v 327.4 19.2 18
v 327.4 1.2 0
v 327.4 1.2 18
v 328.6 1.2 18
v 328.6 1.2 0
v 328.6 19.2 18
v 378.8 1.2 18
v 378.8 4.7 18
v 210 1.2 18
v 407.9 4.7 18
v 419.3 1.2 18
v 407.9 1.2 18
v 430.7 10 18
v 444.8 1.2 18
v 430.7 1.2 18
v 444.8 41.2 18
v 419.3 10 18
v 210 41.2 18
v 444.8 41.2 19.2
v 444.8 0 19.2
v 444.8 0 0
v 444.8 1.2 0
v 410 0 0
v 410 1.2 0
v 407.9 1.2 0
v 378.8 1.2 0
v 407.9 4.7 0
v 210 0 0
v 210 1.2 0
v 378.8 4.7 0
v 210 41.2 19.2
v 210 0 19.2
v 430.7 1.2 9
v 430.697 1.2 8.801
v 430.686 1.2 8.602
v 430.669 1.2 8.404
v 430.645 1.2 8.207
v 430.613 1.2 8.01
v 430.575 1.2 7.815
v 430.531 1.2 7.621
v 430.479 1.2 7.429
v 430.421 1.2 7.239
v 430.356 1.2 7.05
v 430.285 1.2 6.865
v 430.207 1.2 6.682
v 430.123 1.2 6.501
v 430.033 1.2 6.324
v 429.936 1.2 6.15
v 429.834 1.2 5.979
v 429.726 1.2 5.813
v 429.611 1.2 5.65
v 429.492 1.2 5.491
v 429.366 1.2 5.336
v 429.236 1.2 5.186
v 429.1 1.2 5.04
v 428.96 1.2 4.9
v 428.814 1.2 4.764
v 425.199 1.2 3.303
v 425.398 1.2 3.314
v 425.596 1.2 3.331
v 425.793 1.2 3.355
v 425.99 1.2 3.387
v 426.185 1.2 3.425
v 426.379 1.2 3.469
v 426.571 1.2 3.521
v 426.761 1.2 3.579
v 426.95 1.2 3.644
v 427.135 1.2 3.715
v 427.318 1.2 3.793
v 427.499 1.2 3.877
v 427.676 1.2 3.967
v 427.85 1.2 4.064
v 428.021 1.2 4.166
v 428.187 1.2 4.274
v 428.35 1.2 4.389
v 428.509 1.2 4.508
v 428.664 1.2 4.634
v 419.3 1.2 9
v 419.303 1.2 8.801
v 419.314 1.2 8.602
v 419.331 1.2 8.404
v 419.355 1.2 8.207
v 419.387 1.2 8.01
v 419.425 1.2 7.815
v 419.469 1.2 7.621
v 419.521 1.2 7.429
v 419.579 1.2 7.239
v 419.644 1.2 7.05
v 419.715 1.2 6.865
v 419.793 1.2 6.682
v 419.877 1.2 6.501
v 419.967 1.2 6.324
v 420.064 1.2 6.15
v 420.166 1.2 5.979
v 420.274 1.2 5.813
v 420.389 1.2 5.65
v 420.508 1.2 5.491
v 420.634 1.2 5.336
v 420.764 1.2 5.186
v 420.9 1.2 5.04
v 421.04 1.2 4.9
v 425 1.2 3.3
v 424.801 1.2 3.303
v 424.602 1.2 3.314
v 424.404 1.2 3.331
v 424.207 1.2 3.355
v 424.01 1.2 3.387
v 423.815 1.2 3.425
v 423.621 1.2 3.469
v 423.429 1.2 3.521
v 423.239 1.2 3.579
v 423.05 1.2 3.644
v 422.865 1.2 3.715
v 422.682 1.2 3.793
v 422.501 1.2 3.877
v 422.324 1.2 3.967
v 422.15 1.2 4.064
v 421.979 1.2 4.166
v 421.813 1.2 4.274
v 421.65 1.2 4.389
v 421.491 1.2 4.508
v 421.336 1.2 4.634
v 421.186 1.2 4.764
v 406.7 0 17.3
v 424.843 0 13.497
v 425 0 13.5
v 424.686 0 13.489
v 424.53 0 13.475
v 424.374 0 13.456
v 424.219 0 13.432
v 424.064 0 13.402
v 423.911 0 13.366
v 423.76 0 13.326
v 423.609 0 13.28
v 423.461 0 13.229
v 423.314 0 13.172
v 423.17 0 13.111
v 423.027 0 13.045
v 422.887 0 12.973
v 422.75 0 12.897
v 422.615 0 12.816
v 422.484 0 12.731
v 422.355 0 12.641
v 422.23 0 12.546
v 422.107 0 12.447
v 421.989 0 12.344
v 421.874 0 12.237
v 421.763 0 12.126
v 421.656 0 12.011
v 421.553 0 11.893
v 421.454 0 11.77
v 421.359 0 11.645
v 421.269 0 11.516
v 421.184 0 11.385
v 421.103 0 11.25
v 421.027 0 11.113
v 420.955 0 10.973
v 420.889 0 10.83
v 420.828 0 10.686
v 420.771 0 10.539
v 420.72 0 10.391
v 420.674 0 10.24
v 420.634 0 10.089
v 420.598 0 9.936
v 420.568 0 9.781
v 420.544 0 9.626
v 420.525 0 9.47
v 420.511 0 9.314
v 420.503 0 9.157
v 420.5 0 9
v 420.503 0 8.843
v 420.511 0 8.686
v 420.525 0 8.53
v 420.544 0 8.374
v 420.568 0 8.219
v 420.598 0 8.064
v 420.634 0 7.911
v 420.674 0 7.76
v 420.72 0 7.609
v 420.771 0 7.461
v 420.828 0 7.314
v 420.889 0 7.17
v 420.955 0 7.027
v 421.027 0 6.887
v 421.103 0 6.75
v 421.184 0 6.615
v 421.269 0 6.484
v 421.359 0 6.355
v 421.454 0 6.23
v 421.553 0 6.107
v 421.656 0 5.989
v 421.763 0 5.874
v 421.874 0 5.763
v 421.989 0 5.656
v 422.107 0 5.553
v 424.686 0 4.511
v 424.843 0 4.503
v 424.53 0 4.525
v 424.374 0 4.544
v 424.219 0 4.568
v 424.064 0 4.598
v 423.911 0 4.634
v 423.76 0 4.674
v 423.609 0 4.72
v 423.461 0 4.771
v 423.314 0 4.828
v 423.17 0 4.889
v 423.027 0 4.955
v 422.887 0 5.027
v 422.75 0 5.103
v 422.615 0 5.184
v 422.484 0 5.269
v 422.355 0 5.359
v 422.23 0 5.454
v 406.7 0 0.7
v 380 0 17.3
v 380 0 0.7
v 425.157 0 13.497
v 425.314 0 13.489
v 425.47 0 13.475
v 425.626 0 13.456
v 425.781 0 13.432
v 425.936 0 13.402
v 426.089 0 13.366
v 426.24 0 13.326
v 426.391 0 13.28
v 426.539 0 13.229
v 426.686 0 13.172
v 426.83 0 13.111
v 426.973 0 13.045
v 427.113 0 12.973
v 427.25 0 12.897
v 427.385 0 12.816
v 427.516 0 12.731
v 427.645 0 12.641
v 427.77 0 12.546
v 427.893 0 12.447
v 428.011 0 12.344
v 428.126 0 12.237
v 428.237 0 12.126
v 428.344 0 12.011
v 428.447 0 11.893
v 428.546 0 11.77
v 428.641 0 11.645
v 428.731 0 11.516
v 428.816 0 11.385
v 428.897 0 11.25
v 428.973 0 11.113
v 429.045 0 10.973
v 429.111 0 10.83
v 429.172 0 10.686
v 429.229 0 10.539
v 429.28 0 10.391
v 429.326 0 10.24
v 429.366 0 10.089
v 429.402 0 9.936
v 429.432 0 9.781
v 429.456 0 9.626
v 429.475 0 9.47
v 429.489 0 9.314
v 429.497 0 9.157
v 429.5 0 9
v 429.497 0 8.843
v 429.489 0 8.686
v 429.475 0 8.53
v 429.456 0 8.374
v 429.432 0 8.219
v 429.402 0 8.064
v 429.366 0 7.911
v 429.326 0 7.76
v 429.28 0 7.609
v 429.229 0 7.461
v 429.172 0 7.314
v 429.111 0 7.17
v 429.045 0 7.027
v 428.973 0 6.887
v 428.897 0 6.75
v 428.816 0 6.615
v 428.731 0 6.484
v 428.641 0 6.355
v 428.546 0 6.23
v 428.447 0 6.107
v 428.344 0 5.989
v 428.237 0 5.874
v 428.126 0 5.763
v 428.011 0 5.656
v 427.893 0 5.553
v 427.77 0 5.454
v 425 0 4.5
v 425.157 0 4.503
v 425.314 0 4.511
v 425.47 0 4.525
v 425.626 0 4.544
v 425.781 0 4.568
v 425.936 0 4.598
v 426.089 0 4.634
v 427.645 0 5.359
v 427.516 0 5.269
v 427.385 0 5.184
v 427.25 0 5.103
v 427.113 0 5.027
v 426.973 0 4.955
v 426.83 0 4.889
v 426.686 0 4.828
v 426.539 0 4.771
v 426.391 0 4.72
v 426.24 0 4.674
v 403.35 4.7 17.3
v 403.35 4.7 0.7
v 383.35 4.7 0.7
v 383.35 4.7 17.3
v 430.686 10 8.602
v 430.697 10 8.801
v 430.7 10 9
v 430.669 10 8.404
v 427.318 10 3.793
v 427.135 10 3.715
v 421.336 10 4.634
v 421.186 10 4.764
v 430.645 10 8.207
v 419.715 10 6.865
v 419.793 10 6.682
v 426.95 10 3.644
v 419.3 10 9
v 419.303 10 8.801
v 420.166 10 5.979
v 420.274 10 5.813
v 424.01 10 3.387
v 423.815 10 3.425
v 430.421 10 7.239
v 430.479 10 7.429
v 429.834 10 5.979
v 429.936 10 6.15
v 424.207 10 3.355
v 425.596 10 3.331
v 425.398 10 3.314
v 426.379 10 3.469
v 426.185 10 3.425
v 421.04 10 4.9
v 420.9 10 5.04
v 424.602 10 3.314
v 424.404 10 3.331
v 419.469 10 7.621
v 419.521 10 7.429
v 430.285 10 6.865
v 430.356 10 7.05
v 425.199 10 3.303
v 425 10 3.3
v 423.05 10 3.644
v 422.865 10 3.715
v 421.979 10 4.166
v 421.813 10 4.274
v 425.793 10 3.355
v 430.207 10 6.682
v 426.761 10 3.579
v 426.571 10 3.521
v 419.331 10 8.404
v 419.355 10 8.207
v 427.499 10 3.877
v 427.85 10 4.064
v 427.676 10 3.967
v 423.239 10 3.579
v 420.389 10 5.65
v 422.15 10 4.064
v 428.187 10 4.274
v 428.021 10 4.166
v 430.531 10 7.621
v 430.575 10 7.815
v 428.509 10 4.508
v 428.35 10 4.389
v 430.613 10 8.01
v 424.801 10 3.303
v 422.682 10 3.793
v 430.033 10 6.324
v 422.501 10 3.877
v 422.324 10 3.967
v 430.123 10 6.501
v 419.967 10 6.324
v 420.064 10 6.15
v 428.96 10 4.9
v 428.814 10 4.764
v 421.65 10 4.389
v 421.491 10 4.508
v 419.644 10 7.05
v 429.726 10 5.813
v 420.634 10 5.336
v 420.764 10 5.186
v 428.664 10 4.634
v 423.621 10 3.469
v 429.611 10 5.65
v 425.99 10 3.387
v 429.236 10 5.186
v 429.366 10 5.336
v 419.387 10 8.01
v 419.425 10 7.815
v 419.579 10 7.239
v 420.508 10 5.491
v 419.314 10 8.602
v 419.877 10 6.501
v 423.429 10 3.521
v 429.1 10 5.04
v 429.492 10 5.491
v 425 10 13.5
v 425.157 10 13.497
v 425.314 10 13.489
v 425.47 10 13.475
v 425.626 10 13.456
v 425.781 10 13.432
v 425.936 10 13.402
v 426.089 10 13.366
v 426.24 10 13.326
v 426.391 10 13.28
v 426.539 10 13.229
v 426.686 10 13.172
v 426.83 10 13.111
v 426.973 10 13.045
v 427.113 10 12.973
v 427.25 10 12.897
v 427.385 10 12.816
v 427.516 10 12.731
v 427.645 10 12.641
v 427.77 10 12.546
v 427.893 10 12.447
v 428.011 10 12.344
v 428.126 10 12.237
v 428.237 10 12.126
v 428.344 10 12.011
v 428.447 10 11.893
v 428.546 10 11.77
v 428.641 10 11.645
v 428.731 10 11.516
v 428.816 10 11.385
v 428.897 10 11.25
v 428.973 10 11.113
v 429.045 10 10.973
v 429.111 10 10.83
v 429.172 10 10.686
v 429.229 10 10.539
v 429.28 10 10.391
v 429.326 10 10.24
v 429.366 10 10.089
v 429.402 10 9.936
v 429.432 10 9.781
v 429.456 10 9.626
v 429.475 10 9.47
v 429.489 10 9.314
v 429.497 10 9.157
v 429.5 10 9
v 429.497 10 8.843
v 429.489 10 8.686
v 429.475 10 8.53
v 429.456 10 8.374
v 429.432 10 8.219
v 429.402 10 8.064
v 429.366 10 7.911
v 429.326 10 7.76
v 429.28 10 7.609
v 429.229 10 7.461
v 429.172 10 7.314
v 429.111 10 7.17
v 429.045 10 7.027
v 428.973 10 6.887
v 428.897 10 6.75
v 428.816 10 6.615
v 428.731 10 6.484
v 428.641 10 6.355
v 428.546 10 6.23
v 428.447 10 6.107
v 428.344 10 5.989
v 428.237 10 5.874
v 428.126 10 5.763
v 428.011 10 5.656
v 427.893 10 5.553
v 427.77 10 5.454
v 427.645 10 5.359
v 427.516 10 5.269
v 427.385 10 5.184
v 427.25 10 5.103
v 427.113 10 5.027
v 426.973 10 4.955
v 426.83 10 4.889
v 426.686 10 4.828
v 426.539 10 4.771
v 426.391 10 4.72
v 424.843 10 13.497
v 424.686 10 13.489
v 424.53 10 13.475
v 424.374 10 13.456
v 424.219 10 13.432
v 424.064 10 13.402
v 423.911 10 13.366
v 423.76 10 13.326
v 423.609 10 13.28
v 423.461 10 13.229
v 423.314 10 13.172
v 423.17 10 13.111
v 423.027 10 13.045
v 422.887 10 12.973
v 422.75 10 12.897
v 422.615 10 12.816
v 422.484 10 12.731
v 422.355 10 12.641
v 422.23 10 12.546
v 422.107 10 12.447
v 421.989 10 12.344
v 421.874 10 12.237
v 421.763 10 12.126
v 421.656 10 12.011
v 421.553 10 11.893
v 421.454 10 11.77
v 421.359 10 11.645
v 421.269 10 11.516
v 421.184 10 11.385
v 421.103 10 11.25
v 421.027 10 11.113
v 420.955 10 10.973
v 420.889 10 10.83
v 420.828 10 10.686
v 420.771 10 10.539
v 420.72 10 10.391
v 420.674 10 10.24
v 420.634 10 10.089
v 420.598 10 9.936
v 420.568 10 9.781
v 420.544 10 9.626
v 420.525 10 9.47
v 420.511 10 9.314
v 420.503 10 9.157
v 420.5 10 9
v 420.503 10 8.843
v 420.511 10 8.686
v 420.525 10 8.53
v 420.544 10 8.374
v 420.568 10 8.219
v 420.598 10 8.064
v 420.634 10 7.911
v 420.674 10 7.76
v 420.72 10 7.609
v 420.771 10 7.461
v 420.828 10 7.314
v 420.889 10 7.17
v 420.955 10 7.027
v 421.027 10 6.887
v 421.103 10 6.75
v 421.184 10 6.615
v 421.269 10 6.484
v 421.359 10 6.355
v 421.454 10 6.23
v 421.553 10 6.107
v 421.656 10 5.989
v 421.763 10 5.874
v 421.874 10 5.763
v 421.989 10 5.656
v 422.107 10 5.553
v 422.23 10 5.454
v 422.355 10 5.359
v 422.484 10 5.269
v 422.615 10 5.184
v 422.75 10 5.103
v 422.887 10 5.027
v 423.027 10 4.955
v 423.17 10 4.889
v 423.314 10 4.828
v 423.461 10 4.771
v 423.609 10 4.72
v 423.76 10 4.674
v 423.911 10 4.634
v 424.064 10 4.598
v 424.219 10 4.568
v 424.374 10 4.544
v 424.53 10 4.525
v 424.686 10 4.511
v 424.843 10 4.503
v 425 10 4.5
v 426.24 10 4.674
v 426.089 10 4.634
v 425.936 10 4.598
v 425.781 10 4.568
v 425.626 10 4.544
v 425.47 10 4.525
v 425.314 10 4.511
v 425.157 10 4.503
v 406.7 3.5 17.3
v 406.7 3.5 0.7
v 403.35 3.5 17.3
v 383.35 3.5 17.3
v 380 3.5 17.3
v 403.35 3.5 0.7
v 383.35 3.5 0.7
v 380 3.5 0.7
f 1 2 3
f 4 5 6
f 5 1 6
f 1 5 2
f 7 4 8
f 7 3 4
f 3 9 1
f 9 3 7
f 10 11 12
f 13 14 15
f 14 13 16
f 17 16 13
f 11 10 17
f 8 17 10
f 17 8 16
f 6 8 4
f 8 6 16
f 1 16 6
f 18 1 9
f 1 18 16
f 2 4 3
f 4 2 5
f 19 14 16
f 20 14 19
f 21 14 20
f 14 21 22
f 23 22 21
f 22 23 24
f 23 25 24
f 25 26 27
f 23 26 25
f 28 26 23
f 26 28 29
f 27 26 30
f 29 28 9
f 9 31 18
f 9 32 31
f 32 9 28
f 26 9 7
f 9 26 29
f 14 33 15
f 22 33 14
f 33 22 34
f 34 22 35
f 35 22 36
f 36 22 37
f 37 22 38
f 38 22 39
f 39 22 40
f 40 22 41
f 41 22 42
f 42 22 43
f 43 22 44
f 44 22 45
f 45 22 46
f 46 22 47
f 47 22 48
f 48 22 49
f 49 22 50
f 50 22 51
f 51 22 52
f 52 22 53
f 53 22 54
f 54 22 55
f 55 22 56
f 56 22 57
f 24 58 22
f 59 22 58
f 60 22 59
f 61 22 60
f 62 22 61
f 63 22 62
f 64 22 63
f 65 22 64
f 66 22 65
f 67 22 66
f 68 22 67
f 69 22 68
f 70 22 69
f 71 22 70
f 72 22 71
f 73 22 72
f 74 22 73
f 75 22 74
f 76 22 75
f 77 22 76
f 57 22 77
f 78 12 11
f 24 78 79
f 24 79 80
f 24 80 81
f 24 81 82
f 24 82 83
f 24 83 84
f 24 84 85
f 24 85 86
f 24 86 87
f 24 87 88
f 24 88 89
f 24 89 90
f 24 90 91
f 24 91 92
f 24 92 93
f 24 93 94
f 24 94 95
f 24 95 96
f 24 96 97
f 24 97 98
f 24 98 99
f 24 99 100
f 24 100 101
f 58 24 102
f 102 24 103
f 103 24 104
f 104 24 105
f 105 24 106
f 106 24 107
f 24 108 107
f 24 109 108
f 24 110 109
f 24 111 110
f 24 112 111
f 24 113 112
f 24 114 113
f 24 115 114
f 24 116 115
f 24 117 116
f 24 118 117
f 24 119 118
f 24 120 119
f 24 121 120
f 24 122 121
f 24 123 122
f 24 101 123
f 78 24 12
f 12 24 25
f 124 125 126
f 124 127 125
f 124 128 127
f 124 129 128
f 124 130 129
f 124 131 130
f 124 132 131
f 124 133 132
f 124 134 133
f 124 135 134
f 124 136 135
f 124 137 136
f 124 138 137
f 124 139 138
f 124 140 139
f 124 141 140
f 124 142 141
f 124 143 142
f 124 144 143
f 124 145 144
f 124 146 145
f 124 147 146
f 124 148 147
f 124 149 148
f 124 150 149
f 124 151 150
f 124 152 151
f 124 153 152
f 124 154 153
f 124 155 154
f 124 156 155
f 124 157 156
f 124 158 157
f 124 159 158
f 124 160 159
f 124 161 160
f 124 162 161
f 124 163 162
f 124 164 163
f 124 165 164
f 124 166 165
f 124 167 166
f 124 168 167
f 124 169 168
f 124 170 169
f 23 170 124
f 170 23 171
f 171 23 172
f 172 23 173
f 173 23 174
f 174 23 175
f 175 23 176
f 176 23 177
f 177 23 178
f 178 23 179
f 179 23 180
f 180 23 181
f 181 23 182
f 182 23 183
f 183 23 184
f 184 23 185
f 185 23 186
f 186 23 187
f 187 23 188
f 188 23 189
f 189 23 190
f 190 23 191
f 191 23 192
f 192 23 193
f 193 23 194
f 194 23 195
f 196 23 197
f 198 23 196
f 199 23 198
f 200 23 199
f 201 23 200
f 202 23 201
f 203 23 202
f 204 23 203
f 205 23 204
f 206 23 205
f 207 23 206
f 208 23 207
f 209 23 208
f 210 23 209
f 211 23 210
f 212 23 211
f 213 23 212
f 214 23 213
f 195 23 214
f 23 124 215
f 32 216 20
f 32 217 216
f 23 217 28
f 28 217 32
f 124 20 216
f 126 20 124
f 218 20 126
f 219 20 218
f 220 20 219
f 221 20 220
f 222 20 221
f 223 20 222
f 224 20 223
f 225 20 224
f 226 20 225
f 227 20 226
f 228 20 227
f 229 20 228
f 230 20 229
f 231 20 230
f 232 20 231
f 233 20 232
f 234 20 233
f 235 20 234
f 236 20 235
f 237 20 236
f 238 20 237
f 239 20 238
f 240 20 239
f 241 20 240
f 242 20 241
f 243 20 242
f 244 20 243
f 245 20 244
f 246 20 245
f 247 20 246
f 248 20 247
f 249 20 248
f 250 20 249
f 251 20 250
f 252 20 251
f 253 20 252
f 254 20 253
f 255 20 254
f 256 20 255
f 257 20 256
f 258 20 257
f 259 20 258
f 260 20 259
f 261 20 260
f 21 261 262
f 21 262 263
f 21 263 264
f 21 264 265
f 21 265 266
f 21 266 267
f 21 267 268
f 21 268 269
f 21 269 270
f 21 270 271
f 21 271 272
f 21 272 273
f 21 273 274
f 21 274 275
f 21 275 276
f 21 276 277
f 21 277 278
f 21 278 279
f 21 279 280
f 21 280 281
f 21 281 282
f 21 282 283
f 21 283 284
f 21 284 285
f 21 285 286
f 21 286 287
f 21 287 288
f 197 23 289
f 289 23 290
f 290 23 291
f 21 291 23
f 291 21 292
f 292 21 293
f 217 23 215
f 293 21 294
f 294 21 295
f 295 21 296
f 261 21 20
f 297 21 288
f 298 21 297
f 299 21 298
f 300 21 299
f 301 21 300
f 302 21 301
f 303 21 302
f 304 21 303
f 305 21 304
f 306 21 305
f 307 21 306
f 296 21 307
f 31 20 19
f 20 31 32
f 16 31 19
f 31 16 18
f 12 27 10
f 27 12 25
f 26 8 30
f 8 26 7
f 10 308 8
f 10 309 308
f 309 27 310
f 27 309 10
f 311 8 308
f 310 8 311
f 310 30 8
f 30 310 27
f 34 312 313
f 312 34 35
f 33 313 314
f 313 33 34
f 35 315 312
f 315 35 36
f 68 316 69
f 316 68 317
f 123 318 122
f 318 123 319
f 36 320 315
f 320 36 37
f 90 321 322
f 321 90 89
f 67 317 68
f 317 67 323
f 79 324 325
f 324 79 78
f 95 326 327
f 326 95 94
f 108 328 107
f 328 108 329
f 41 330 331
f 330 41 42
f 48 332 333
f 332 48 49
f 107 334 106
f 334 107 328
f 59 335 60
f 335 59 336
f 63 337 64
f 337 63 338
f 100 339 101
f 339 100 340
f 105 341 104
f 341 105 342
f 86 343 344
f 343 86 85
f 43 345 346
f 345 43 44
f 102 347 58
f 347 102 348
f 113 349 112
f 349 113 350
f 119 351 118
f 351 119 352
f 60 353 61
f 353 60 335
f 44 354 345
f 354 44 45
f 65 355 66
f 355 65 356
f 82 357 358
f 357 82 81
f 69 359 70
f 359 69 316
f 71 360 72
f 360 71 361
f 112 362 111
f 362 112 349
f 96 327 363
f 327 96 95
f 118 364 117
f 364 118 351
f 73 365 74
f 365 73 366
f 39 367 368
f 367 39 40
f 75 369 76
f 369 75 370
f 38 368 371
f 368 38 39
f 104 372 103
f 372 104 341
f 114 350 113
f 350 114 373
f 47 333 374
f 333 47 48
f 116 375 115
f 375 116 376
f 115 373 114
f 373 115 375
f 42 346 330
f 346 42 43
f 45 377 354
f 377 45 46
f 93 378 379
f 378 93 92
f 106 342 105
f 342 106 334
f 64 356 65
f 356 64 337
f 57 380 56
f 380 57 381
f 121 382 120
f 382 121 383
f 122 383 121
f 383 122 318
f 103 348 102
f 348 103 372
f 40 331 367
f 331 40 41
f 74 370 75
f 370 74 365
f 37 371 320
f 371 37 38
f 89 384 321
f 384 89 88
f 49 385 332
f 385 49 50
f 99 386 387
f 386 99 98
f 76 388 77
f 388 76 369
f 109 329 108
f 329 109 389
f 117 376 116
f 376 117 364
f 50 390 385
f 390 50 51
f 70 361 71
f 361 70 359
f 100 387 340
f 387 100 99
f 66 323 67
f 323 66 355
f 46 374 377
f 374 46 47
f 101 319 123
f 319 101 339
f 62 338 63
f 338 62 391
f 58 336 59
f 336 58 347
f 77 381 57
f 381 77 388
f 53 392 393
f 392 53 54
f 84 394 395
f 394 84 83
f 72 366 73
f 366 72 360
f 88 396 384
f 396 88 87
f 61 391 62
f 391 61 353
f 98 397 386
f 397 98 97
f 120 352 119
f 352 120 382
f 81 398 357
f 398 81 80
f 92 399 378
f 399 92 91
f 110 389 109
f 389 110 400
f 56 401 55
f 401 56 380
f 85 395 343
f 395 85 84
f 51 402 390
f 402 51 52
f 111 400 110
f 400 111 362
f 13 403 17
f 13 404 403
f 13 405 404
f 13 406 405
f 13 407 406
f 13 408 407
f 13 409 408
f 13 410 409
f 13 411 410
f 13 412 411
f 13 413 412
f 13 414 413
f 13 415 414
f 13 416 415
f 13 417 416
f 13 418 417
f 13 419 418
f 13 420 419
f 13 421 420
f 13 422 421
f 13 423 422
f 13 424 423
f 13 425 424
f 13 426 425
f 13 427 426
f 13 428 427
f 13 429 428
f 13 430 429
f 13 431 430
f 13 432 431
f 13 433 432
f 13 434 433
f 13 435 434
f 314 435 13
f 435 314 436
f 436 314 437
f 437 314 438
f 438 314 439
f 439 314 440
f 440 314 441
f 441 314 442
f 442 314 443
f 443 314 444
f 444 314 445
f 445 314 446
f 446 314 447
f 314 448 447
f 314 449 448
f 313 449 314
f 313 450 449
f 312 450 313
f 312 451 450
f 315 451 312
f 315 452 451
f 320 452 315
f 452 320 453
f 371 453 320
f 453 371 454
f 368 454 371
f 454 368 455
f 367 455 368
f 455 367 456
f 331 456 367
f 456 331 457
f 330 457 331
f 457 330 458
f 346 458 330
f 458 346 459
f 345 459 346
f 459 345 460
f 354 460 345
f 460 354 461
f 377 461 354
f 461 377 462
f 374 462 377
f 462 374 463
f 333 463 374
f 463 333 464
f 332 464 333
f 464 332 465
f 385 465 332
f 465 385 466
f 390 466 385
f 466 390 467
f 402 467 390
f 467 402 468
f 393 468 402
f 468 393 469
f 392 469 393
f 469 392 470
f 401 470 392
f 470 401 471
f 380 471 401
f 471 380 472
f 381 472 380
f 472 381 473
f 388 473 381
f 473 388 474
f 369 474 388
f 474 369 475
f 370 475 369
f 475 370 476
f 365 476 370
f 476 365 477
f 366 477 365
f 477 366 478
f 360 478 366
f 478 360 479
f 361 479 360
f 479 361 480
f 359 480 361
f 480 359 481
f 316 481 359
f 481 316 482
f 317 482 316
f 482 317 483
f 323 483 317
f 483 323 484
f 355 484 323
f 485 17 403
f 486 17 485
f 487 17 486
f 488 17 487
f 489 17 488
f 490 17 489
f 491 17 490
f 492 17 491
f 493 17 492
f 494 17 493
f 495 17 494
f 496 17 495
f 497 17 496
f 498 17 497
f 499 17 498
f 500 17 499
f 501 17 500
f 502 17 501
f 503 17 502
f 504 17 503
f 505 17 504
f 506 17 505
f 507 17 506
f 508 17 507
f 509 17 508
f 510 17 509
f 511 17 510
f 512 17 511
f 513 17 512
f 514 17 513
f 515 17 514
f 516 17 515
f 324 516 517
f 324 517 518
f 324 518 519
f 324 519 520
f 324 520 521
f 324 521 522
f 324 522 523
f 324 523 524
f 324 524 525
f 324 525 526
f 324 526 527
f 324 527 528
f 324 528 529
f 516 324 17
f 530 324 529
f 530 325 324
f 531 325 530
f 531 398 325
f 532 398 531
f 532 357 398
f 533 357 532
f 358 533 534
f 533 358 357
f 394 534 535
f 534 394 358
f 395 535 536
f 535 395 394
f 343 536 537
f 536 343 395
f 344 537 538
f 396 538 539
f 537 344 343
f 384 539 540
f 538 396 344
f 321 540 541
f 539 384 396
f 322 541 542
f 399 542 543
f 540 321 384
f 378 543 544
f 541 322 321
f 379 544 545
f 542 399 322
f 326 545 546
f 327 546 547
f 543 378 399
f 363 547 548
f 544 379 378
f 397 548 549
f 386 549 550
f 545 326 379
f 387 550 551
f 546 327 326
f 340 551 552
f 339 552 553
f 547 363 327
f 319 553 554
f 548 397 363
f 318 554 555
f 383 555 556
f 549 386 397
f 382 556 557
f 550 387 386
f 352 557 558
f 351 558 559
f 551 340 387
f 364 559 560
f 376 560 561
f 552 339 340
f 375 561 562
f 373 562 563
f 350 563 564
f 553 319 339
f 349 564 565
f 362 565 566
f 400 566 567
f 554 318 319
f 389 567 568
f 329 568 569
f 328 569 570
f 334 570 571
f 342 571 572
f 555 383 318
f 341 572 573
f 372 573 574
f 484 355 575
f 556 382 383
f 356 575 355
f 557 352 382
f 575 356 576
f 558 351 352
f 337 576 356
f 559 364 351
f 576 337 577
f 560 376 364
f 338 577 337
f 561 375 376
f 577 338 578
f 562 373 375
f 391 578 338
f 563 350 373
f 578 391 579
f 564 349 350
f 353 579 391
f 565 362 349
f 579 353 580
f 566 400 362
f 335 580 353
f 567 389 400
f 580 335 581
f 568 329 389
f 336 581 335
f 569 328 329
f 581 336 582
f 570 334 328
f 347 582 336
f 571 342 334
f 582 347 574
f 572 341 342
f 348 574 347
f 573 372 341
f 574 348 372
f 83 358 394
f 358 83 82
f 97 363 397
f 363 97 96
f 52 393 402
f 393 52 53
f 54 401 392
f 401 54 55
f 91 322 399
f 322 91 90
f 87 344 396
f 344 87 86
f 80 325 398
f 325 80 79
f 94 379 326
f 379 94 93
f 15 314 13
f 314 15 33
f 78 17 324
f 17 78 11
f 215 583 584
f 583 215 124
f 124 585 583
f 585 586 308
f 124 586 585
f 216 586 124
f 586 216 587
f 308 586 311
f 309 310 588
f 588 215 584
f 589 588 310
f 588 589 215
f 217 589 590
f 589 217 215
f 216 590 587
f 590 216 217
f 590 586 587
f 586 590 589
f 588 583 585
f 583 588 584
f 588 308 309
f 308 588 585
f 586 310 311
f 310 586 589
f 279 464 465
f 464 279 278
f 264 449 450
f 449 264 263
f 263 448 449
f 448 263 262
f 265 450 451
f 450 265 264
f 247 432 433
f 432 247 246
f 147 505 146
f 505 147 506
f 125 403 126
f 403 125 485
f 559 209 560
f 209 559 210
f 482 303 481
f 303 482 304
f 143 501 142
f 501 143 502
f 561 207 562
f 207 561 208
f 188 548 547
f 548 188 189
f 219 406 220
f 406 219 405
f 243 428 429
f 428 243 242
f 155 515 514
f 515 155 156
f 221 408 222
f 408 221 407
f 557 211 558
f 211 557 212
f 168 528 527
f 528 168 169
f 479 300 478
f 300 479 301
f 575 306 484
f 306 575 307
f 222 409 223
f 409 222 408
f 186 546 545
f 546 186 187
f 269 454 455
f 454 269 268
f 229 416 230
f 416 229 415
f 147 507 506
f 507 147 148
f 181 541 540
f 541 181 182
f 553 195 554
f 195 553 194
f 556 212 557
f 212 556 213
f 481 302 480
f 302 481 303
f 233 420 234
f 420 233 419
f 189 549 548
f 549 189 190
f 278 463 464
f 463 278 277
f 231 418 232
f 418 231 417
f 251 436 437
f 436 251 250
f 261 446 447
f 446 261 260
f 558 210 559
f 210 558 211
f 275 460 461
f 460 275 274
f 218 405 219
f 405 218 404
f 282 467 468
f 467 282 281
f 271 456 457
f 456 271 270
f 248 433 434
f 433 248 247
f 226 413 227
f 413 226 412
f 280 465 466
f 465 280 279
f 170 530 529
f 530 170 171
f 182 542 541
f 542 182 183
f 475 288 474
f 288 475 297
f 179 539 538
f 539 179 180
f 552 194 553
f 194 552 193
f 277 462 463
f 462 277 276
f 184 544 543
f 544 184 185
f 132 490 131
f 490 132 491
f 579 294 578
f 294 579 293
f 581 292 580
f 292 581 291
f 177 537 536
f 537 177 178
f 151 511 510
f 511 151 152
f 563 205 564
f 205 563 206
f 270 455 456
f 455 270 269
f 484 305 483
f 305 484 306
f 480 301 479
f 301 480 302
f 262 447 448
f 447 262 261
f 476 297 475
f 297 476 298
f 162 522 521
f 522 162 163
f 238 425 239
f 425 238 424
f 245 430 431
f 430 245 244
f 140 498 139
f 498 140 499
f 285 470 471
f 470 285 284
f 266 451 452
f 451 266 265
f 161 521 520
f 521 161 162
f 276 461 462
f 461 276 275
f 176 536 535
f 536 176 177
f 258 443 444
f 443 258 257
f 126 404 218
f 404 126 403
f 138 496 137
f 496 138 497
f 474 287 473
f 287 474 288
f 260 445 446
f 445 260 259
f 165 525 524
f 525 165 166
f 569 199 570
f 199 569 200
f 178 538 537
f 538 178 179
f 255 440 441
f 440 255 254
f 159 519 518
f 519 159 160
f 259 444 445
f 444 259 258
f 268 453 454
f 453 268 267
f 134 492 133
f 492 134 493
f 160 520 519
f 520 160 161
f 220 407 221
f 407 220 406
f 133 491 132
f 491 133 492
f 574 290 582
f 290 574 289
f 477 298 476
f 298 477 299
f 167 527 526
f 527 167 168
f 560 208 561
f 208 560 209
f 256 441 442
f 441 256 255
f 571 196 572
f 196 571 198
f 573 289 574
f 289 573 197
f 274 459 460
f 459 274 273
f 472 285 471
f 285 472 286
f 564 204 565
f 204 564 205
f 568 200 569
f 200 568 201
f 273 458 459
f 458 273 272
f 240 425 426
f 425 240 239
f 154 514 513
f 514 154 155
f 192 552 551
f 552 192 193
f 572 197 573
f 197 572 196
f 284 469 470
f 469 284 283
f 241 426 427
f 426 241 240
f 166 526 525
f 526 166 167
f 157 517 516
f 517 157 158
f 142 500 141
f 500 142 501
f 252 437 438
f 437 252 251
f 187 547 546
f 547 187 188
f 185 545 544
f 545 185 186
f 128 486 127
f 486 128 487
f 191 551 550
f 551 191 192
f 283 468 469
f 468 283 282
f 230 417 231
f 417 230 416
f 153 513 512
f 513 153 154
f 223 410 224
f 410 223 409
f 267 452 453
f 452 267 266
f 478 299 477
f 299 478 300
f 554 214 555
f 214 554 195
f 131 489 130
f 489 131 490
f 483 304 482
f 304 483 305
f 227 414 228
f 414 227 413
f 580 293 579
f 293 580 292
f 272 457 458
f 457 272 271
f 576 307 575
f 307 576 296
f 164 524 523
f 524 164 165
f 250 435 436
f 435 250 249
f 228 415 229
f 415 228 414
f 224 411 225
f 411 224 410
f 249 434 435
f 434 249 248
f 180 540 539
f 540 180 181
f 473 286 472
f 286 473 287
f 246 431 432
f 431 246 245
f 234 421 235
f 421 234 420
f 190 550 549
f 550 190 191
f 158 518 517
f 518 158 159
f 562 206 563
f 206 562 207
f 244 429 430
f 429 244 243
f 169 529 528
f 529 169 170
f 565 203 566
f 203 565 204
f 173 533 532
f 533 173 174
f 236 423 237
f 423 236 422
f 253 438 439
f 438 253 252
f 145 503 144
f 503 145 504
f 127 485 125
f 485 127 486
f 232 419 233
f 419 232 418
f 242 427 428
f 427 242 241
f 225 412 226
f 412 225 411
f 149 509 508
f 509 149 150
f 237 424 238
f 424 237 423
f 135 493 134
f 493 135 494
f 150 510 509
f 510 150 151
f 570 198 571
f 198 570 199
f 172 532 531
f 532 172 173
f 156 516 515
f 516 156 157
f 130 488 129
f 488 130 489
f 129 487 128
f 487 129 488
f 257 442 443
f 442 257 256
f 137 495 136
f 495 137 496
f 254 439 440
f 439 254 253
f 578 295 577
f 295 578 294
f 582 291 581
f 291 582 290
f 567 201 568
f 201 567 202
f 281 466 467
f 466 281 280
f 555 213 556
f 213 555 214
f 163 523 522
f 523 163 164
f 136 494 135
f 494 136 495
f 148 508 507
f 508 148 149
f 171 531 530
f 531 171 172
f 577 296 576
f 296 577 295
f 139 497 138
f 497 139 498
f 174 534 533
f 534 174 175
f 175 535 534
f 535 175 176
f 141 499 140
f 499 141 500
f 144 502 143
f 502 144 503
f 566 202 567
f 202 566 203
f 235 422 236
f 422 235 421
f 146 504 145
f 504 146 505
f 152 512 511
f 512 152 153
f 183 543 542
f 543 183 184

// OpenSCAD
thickness = 1.2000000000;
depth = 40;
length1 = 200;
length2 = 234.8;
cable_sleeve_depth = 10;
$fn = 180;
render1 = false;
render2 = true;

height = 18; //USB hub measures 18mm.
usb_z = 5.7;
usb_height = 5.7;
usb1_x = 16;
usb2_x = 37;
usb_width = 13;
usb_hub_width = 66;
hdmi_x = 140;
hdmi_width = 20.9;
hdmi_height = 11.3 + 0.3;
hdmi_depth = 29.4;
hdmi_inner_width = 12;
switch_x = 170;
switch_width = 26.7;
switch_height = 16.5 + 0.1;
switch_depth = 3.5;
switch_inner_width = 20;
cable_x = 215;
cable_diameter = 9;

if(render1) {
	difference() {
		union() {
			cube([length1, thickness, height]);
			translate([0, 0, height]) {
				cube([length1, thickness + depth, thickness]);
			}
			translate([usb_hub_width, thickness, 0]) { //Rib for strength.
				intersection() {
					rotate([45, 0, 0]) {
						cube([thickness, height * 1.5, height * 1.5]);
					}
					cube([thickness, height, height]);
				}
			}
			translate([hdmi_x - thickness, thickness, 0]) { //Chamber for HDMI adapter.
				cube([hdmi_width + thickness * 2, hdmi_depth, height]);
			}
		}

		//The ports.
		translate([usb1_x, -1, height - usb_height - usb_z]) {
			cube([usb_width, thickness + 2, usb_height]);
		}
		translate([usb2_x, -1, height - usb_height - usb_z]) {
			cube([usb_width, thickness + 2, usb_height]);
		}
		translate([hdmi_x, -1, height / 2 - hdmi_height / 2]) {
			cube([hdmi_width, 1 + hdmi_depth, hdmi_height]);
			translate([(hdmi_width - hdmi_inner_width) / 2, hdmi_depth + thickness - 1, 0]) {
				cube([hdmi_inner_width, thickness + 2, hdmi_height]);
			}
		}
	}
}

if(render2) {
	translate([length1 + 10, 0, 0]) {
		difference() {
			union() {
				cube([length2, thickness, height]);
				translate([0, 0, height]) {
					cube([length2, thickness + depth, thickness]);
				}
				translate([length2 / 2, thickness, 0]) { //Rib for strength.
					intersection() {
						rotate([45, 0, 0]) {
							cube([thickness, height * 1.5, height * 1.5]);
						}
						cube([thickness, height, height]);
					}
				}
				//Chamber for switch.
				translate([switch_x - thickness, thickness, height / 2 - switch_height / 2 - thickness]) {
					cube([switch_width + thickness * 2, switch_depth, switch_height + thickness * 2]);
				}
				//Cable sleeve.
				translate([cable_x, 0, height / 2]) {
					rotate([-90, 0, 0]) {
						cylinder(h=cable_sleeve_depth, r=cable_diameter / 2 + thickness);
					}
				}
				translate([cable_x - cable_diameter / 2 - thickness, 0, height / 2]) {
					cube([cable_diameter + thickness * 2, cable_sleeve_depth, height / 2]);
				}
			}

			//Switch.
			translate([switch_x, -1, height / 2 - switch_height / 2]) {
				cube([switch_width, 1 + switch_depth, switch_height]);
				translate([(switch_width - switch_inner_width) / 2, switch_depth + thickness - 1, 0]) {
					cube([switch_inner_width, thickness + 2, switch_height]);
				}
			}

			//Cable hole.
			translate([cable_x, -1, height / 2]) {
				rotate([-90, 0, 0]) {
					cylinder(h=cable_sleeve_depth + 2, r=cable_diameter / 2);
				}
			}

			//Switch is a bit too low with thickness, so cut off from the bottom if needed.
			translate([0, 0, -10]) {
				cube([length1, 10, 10]);
			}
		}
	}
}
